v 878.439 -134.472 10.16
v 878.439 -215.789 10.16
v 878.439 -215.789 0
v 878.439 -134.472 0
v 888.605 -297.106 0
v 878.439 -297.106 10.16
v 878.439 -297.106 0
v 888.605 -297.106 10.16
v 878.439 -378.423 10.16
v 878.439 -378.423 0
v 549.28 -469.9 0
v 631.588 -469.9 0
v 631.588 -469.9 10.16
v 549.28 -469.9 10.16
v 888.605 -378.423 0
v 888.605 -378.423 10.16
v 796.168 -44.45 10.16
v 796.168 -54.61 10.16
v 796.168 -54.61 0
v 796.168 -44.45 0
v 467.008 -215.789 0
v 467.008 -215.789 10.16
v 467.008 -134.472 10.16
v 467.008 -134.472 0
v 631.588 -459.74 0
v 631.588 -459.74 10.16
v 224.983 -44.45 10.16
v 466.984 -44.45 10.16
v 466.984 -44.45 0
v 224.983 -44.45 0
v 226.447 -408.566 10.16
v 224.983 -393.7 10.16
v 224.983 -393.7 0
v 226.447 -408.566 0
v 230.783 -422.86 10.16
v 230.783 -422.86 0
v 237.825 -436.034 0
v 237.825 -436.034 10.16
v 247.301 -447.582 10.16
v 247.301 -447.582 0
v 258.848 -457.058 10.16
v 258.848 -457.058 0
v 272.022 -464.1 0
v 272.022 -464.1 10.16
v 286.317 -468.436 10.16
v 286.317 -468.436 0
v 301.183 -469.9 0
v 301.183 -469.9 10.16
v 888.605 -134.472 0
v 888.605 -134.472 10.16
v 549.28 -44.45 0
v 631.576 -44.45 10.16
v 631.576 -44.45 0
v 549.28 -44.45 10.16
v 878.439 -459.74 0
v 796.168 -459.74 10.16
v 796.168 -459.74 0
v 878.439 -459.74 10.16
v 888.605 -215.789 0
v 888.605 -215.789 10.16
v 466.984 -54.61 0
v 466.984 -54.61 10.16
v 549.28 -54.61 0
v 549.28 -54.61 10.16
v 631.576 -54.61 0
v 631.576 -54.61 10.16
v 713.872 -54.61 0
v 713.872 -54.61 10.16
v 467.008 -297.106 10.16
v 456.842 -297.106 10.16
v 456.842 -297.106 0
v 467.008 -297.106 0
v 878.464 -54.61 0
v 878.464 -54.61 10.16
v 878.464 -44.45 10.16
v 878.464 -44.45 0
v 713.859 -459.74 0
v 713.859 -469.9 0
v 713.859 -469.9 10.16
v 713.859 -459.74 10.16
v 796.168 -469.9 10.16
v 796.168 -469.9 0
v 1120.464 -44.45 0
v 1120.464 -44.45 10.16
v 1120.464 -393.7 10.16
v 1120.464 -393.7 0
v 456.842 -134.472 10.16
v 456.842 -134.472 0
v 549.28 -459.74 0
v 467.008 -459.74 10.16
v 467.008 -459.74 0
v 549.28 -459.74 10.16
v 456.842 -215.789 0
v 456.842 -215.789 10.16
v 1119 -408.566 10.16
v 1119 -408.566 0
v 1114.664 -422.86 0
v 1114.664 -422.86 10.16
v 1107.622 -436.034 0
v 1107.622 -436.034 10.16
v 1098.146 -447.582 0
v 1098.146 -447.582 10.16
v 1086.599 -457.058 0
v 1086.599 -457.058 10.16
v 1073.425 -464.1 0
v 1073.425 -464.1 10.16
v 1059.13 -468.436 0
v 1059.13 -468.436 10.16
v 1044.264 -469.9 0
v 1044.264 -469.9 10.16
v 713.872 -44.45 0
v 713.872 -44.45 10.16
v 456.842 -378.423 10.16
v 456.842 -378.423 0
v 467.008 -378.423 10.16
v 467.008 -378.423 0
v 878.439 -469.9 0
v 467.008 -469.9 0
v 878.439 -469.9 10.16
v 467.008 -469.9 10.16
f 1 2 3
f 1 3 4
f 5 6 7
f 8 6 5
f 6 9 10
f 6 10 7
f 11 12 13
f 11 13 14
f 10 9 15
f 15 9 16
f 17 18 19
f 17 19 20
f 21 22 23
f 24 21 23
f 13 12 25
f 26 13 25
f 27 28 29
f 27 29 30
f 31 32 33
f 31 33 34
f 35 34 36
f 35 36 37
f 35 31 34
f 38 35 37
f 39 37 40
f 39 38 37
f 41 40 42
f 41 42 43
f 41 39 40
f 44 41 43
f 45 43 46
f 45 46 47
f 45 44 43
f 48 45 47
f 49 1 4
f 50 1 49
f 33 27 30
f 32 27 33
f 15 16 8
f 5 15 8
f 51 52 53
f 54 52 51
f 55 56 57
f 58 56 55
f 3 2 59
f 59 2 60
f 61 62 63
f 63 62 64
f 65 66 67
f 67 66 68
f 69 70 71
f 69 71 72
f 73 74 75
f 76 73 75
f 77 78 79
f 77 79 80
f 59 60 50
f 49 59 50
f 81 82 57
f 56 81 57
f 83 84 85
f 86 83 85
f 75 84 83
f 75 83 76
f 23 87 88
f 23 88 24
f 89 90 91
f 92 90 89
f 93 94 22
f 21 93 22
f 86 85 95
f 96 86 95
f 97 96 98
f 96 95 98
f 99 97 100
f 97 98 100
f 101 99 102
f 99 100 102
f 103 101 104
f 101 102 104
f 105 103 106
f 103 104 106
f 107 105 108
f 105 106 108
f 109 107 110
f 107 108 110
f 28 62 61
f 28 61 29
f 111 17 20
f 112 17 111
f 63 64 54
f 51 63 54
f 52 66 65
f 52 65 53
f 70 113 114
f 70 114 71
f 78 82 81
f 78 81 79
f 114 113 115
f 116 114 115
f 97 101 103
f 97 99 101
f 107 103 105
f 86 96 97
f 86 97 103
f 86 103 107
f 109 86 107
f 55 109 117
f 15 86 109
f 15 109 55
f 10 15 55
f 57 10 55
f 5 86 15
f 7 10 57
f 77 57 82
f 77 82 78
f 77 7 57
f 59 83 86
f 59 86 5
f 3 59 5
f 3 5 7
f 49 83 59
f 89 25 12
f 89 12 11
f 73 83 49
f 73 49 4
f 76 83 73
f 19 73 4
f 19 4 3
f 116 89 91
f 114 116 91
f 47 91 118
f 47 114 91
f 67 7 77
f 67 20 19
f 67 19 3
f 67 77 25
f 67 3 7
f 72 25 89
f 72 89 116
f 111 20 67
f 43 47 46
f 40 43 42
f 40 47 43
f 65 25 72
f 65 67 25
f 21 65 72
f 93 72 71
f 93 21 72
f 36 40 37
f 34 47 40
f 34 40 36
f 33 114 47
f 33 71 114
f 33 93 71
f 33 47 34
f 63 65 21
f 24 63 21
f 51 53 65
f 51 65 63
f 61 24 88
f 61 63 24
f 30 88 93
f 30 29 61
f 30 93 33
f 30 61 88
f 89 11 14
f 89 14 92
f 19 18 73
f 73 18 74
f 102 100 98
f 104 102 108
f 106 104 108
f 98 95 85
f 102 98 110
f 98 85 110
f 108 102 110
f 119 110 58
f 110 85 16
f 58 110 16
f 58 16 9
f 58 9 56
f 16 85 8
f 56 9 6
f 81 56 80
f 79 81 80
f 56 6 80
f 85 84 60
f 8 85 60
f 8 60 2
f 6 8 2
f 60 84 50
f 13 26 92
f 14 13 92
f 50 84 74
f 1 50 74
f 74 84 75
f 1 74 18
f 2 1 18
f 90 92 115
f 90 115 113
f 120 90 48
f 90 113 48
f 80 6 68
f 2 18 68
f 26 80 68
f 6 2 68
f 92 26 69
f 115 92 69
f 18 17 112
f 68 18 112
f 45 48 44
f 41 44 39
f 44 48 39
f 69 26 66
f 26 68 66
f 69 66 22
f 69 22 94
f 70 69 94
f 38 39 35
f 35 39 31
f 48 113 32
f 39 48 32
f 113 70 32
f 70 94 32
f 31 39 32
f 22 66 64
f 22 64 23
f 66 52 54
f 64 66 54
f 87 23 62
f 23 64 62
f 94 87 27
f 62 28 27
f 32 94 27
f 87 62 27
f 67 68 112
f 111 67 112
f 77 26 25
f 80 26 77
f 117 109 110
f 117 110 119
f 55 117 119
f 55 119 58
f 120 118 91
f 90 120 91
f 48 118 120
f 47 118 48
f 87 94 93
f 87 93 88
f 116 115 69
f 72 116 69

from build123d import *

# Parameters (mm, degrees)
BOSS_EXTRUDE1_DEPTH = 10.16
SKETCH2_W           = 10.166490401
SKETCH2_H           = 81.316938585
SKETCH2_W_2         = 10.166490402
SKETCH2_H_2         = 81.316938584
SKETCH2_W_3         = 82.271298803
SKETCH2_H_3         = 10.16
CUT_EXTRUDE2_DEPTH  = 137.414
CUT_EXTRUDE3_DEPTH  = 1426.179737238
SKETCH5_W           = 82.296
SKETCH5_H           = 10.16
CUT_EXTRUDE4_DEPTH  = 1408.779997291
CUT_EXTRUDE5_DEPTH  = 1408.779997291
CUT_EXTRUDE6_DEPTH  = 25.4


with BuildPart() as part:
    # Sketch1 → Boss-Extrude1 (new body)
    with BuildSketch(Plane.XY):
        with BuildLine():
            Line((0, 0), (1345.447057269, 0))
            Line((1345.447057269, 0), (1156.937235756, -454.288839135))
            add(Edge.make_bspline(
                [(1156.937235756, -454.288839135), (1155.965204773, -456.631331547), (1154.630956054, -458.816896883), (1152.225947859, -461.69350105), (1151.355065983, -462.590813772), (1149.473312624, -464.260936999), (1148.45987476, -465.033112958), (1146.360299176, -466.401155283), (1145.26635201, -467.004685932), (1142.990856866, -468.052074807), (1141.798989191, -468.498505895), (1138.174492983, -469.560599459), (1135.699262078, -469.911644948), (1133.16419506, -469.9)],
                knots=[0, 0, 0, 0, 0.25, 0.25, 0.375, 0.375, 0.5, 0.5, 0.625, 0.625, 0.75, 0.75, 1, 1, 1, 1], degree=3))
            Line((1133.16419506, -469.9), (212.282862208, -469.9))
            add(Edge.make_bspline(
                [(188.509821513, -454.288839135), (189.481852496, -456.631331547), (190.816101215, -458.816896883), (193.22110941, -461.69350105), (194.091991286, -462.590813772), (195.973744645, -464.260936999), (196.987182509, -465.033112958), (199.086758093, -466.401155283), (200.180705259, -467.004685932), (202.456200403, -468.052074807), (203.648068078, -468.498505895), (207.272564286, -469.560599459), (209.747795191, -469.911644948), (212.282862208, -469.9)],
                knots=[0, 0, 0, 0, 0.25, 0.25, 0.375, 0.375, 0.5, 0.5, 0.625, 0.625, 0.75, 0.75, 1, 1, 1, 1], degree=3))
            Line((188.509821513, -454.288839135), (0, 0))
        make_face()
    extrude(amount=BOSS_EXTRUDE1_DEPTH)

    # Sketch2 → Cut-Extrude2 (cut)
    with BuildSketch(Plane.XY.offset(10.16)):
        with Locations((461.924984631, -337.764592123)):
            Rectangle(SKETCH2_W, SKETCH2_H)
        with Locations((883.522072638, -337.764592123)):
            Rectangle(SKETCH2_W_2, SKETCH2_H)
        with Locations((883.522072638, -175.130714953)):
            Rectangle(SKETCH2_W_2, SKETCH2_H_2)
        with Locations((461.924984631, -175.130714953)):
            Rectangle(SKETCH2_W, SKETCH2_H_2)
        with Locations((837.303178036, -464.82)):
            Rectangle(SKETCH2_W_3, SKETCH2_H_3)
        with Locations((672.723528635, -464.82)):
            Rectangle(SKETCH2_W_3, SKETCH2_H_3)
        with Locations((508.143879233, -464.82)):
            Rectangle(SKETCH2_W_3, SKETCH2_H_3)
    extrude(amount=-CUT_EXTRUDE2_DEPTH, mode=Mode.SUBTRACT)

    # Sketch4 → Cut-Extrude3 (cut, through all)
    with BuildSketch(Plane.XY.offset(10.16)):
        Polygon((0, 0), (1345.447057269, 0), (1327.002268746, -44.45), (18.444788523, -44.45), align=None)
    extrude(amount=-CUT_EXTRUDE3_DEPTH, mode=Mode.SUBTRACT)

    # Sketch5 → Cut-Extrude4 (cut, through all)
    with BuildSketch(Plane.XY.offset(10.16)):
        with Locations((508.131528634, -49.53)):
            Rectangle(SKETCH5_W, SKETCH5_H)
        with Locations((672.723528634, -49.53)):
            Rectangle(SKETCH5_W, SKETCH5_H)
        with Locations((837.315528634, -49.53)):
            Rectangle(SKETCH5_W, SKETCH5_H)
    extrude(amount=-CUT_EXTRUDE4_DEPTH, mode=Mode.SUBTRACT)

    # Sketch6 → Cut-Extrude5 (cut, through all)
    with BuildSketch(Plane.XY.offset(10.16)):
        Polygon((192.807539001, -448.077869782), (224.982862208, -469.9), (232.080223429, -549.766419732), (-59.510742861, -242.335130221), (-120.238907144, 37.382474964), (56.544788523, -44.45), (56.544788523, -119.698975594), align=None)
        Polygon((1120.46419506, -469.9), (1113.36683384, -549.766419732), (1404.95780013, -242.335130221), (1465.685964413, 37.382474964), (1288.902268746, -44.45), (1288.902268746, -119.698975594), (1152.639518267, -448.077869782), align=None)
    extrude(amount=-CUT_EXTRUDE5_DEPTH, mode=Mode.SUBTRACT)

    # Sketch7 → Cut-Extrude6 (cut)
    with BuildSketch(Plane.XY.offset(10.16)):
        with BuildLine():
            Line((301.182862208, -469.9), (-145.537284928, -469.9))
            Line((-145.537284928, -469.9), (-145.537284928, 127.88628448))
            Line((-145.537284928, 127.88628448), (224.982862208, 127.88628448))
            Line((224.982862208, 127.88628448), (224.982862208, -393.7))
            ThreePointArc((224.982862208, -393.7), (247.301325482, -447.581536726), (301.182862208, -469.9))
        make_face()
        with BuildLine():
            Line((1044.26419506, -469.9), (1351.858793672, -469.9))
            Line((1351.858793672, -469.9), (1351.858793672, 23.69842382))
            Line((1351.858793672, 23.69842382), (1120.46419506, 23.69842382))
            Line((1120.46419506, 23.69842382), (1120.46419506, -393.7))
            ThreePointArc((1120.46419506, -393.7), (1098.145731787, -447.581536726), (1044.26419506, -469.9))
        make_face()
    extrude(amount=-CUT_EXTRUDE6_DEPTH, mode=Mode.SUBTRACT)


solid = part.part
